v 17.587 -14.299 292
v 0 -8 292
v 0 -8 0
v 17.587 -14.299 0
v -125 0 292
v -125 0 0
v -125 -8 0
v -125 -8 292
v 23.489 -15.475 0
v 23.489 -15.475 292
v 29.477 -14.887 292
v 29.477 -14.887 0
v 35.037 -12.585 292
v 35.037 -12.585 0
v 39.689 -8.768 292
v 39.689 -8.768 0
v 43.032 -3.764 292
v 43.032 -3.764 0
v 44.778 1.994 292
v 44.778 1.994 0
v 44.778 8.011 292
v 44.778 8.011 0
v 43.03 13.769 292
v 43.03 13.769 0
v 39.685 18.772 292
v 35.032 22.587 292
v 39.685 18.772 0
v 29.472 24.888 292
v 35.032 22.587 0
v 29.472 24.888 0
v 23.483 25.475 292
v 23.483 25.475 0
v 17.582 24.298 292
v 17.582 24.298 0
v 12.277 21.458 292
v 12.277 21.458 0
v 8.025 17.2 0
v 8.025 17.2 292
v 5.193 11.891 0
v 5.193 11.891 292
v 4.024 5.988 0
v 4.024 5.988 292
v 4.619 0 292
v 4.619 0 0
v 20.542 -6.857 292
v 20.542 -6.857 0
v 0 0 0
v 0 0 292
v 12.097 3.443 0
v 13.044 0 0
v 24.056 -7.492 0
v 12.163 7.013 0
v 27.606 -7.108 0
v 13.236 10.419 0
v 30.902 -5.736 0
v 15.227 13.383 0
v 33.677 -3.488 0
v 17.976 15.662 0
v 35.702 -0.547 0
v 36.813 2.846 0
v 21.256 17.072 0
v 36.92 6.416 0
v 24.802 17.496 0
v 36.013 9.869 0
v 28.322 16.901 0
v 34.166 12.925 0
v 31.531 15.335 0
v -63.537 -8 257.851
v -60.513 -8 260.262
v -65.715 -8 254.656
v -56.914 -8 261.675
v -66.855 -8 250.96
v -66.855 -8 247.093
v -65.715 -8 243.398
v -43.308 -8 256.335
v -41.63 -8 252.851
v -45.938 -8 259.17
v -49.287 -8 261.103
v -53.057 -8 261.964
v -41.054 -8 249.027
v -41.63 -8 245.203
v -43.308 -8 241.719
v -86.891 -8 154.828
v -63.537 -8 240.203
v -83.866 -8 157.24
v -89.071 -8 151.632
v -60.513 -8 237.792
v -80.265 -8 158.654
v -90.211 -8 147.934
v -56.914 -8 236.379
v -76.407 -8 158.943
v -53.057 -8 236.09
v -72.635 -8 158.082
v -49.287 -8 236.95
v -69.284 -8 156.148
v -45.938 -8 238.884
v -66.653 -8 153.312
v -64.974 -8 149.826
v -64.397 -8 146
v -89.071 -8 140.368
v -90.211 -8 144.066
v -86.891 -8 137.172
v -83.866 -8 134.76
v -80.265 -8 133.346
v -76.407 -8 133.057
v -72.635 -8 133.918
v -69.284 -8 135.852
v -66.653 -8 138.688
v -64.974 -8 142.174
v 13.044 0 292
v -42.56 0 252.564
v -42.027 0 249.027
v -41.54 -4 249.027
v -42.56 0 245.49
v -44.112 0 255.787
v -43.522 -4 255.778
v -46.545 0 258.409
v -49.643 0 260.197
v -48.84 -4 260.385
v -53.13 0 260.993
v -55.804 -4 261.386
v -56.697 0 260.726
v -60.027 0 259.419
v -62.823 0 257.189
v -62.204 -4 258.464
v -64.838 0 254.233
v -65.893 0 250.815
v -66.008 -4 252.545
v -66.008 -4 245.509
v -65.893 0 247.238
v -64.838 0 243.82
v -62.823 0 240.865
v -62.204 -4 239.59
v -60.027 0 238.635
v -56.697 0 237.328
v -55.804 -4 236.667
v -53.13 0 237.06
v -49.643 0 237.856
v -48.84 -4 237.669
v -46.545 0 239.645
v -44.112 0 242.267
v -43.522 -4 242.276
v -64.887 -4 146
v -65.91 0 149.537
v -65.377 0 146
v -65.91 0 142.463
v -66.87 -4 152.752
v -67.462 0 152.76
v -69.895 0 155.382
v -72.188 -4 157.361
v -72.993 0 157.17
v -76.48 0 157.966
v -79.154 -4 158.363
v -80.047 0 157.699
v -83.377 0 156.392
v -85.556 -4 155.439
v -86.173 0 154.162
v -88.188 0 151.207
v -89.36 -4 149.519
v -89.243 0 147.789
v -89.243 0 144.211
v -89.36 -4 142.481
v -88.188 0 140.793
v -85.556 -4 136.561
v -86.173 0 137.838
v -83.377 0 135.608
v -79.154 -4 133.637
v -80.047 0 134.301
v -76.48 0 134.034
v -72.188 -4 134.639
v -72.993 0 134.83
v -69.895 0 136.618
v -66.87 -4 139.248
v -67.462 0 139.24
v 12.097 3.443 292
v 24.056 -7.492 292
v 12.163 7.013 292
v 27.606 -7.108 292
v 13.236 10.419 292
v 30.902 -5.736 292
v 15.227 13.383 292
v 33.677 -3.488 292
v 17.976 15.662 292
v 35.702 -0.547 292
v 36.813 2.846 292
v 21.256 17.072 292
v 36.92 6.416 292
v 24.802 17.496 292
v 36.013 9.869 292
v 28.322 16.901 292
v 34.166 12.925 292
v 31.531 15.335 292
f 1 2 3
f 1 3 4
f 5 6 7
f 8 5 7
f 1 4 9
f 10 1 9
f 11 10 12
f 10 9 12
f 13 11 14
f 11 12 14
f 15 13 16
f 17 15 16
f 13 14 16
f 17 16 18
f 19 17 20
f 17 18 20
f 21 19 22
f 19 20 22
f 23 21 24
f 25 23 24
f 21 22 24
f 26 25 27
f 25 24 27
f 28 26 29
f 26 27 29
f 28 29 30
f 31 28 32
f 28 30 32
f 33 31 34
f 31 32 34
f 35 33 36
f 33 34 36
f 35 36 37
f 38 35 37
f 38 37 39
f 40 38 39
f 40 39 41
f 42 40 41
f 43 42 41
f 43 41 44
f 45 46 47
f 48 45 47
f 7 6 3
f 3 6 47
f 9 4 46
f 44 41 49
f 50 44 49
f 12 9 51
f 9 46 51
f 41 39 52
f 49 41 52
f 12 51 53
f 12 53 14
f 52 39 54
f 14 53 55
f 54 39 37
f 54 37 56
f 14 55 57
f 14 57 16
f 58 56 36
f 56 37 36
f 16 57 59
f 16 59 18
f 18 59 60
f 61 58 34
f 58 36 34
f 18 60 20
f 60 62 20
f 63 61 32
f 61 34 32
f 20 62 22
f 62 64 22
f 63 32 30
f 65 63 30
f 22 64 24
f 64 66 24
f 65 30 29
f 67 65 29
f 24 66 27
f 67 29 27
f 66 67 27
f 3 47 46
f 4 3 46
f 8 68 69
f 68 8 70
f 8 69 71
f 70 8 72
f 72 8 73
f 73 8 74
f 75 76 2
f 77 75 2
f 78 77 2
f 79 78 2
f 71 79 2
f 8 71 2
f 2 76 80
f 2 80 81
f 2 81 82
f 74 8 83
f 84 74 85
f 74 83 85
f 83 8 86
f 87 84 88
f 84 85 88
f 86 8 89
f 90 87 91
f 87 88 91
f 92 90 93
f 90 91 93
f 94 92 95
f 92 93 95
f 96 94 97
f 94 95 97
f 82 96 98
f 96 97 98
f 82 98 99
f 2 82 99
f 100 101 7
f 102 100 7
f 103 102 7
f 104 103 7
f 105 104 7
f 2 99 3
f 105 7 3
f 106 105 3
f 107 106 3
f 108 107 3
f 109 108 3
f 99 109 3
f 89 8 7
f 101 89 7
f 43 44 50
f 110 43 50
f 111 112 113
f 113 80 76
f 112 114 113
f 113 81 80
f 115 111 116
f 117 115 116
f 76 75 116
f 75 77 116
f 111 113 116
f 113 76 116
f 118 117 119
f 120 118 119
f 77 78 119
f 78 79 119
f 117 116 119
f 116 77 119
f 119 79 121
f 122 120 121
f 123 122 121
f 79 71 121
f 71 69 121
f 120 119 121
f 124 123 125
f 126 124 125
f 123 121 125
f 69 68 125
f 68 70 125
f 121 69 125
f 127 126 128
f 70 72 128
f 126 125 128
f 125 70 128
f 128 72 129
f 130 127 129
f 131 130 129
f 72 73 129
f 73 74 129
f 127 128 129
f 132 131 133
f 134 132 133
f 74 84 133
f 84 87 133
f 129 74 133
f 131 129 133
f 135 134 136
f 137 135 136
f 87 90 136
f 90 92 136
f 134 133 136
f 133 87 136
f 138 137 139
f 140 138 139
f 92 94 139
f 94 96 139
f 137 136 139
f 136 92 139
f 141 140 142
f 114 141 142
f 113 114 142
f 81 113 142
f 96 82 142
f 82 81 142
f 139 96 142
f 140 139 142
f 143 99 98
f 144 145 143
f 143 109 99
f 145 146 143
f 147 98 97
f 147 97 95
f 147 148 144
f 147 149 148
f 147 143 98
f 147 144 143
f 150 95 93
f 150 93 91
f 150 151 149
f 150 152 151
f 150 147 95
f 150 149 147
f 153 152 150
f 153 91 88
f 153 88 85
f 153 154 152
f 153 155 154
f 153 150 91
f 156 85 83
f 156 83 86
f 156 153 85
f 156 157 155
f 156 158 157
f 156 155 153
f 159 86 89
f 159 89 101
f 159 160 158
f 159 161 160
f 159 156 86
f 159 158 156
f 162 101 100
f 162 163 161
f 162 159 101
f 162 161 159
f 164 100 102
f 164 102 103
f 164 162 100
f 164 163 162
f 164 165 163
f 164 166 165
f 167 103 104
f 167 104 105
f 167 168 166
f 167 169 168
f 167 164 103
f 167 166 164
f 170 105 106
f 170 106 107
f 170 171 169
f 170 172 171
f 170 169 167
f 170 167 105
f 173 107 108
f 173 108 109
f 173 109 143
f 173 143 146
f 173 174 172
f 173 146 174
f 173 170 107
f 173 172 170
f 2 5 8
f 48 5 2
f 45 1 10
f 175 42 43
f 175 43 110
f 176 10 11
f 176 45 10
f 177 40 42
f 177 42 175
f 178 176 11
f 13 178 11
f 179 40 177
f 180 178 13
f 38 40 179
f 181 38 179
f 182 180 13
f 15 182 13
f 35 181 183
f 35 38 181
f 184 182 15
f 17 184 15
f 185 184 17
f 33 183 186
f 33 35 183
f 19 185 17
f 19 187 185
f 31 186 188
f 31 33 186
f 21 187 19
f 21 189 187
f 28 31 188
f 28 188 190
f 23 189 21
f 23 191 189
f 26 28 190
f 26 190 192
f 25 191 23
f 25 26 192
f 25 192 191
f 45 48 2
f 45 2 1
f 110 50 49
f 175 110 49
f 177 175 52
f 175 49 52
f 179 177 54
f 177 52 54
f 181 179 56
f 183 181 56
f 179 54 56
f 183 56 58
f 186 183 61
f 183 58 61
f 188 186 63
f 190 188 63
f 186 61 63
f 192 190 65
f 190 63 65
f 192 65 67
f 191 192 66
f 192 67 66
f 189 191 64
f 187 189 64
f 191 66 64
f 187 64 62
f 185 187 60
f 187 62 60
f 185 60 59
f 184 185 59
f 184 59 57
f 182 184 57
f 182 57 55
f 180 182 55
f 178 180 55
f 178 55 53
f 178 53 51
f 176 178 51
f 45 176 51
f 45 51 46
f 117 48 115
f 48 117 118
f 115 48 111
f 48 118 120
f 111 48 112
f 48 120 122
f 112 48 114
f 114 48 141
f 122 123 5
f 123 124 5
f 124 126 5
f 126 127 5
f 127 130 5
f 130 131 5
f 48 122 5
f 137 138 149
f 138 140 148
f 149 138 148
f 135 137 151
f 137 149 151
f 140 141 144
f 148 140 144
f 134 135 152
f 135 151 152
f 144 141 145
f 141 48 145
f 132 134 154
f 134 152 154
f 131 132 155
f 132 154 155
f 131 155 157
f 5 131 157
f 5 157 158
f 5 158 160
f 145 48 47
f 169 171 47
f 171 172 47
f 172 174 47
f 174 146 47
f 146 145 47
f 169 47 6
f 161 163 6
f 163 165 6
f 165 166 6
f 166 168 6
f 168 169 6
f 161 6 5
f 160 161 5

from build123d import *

# Parameters (mm, degrees)
F1_DEPTH = 292
F3_R     = 12
F2_R     = 12.973192
F2_R_2   = 12.9794


with BuildPart() as f1:
    # F0 (on Top) → F1 (new body)
    with BuildSketch(Plane.XY):
        with BuildLine():
            Line((20.542224, -6.856897), (0, 0))
            Line((0, 0), (-125, 0))
            Line((-125, 0), (-125, -8))
            Line((-125, -8), (0, -8))
            Line((0, -8), (17.58743, -14.299388))
            ThreePointArc((17.58743, -14.299388), (39.685209, 18.77169), (4.619105, 0))
            Line((4.619105, 0), (13.043561, 0))
            ThreePointArc((13.043561, 0), (32.935269, 14.224762), (20.542224, -6.856897))
        make_face()
    extrude(amount=F1_DEPTH)

    # F3 (on Front) → F4 section 0
    with BuildSketch(Plane.XZ):
        with Locations((-54.026808, 249.026808)):
            Circle(F3_R)
    # F2 (on face) → F4 section 1
    with BuildSketch(Plane.XZ.offset(8)):
        with Locations((-54.026808, 249.026808)):
            Circle(F2_R)
    loft(mode=Mode.SUBTRACT)

    # F2 (on face) → F5 section 0
    with BuildSketch(Plane.XZ.offset(8)):
        with Locations((-77.376664, 146)):
            Circle(F2_R_2)
    # F3 (on Front) → F5 section 1
    with BuildSketch(Plane.XZ):
        with Locations((-77.376664, 146)):
            Circle(F3_R)
    loft(mode=Mode.SUBTRACT)


solid = f1.part
